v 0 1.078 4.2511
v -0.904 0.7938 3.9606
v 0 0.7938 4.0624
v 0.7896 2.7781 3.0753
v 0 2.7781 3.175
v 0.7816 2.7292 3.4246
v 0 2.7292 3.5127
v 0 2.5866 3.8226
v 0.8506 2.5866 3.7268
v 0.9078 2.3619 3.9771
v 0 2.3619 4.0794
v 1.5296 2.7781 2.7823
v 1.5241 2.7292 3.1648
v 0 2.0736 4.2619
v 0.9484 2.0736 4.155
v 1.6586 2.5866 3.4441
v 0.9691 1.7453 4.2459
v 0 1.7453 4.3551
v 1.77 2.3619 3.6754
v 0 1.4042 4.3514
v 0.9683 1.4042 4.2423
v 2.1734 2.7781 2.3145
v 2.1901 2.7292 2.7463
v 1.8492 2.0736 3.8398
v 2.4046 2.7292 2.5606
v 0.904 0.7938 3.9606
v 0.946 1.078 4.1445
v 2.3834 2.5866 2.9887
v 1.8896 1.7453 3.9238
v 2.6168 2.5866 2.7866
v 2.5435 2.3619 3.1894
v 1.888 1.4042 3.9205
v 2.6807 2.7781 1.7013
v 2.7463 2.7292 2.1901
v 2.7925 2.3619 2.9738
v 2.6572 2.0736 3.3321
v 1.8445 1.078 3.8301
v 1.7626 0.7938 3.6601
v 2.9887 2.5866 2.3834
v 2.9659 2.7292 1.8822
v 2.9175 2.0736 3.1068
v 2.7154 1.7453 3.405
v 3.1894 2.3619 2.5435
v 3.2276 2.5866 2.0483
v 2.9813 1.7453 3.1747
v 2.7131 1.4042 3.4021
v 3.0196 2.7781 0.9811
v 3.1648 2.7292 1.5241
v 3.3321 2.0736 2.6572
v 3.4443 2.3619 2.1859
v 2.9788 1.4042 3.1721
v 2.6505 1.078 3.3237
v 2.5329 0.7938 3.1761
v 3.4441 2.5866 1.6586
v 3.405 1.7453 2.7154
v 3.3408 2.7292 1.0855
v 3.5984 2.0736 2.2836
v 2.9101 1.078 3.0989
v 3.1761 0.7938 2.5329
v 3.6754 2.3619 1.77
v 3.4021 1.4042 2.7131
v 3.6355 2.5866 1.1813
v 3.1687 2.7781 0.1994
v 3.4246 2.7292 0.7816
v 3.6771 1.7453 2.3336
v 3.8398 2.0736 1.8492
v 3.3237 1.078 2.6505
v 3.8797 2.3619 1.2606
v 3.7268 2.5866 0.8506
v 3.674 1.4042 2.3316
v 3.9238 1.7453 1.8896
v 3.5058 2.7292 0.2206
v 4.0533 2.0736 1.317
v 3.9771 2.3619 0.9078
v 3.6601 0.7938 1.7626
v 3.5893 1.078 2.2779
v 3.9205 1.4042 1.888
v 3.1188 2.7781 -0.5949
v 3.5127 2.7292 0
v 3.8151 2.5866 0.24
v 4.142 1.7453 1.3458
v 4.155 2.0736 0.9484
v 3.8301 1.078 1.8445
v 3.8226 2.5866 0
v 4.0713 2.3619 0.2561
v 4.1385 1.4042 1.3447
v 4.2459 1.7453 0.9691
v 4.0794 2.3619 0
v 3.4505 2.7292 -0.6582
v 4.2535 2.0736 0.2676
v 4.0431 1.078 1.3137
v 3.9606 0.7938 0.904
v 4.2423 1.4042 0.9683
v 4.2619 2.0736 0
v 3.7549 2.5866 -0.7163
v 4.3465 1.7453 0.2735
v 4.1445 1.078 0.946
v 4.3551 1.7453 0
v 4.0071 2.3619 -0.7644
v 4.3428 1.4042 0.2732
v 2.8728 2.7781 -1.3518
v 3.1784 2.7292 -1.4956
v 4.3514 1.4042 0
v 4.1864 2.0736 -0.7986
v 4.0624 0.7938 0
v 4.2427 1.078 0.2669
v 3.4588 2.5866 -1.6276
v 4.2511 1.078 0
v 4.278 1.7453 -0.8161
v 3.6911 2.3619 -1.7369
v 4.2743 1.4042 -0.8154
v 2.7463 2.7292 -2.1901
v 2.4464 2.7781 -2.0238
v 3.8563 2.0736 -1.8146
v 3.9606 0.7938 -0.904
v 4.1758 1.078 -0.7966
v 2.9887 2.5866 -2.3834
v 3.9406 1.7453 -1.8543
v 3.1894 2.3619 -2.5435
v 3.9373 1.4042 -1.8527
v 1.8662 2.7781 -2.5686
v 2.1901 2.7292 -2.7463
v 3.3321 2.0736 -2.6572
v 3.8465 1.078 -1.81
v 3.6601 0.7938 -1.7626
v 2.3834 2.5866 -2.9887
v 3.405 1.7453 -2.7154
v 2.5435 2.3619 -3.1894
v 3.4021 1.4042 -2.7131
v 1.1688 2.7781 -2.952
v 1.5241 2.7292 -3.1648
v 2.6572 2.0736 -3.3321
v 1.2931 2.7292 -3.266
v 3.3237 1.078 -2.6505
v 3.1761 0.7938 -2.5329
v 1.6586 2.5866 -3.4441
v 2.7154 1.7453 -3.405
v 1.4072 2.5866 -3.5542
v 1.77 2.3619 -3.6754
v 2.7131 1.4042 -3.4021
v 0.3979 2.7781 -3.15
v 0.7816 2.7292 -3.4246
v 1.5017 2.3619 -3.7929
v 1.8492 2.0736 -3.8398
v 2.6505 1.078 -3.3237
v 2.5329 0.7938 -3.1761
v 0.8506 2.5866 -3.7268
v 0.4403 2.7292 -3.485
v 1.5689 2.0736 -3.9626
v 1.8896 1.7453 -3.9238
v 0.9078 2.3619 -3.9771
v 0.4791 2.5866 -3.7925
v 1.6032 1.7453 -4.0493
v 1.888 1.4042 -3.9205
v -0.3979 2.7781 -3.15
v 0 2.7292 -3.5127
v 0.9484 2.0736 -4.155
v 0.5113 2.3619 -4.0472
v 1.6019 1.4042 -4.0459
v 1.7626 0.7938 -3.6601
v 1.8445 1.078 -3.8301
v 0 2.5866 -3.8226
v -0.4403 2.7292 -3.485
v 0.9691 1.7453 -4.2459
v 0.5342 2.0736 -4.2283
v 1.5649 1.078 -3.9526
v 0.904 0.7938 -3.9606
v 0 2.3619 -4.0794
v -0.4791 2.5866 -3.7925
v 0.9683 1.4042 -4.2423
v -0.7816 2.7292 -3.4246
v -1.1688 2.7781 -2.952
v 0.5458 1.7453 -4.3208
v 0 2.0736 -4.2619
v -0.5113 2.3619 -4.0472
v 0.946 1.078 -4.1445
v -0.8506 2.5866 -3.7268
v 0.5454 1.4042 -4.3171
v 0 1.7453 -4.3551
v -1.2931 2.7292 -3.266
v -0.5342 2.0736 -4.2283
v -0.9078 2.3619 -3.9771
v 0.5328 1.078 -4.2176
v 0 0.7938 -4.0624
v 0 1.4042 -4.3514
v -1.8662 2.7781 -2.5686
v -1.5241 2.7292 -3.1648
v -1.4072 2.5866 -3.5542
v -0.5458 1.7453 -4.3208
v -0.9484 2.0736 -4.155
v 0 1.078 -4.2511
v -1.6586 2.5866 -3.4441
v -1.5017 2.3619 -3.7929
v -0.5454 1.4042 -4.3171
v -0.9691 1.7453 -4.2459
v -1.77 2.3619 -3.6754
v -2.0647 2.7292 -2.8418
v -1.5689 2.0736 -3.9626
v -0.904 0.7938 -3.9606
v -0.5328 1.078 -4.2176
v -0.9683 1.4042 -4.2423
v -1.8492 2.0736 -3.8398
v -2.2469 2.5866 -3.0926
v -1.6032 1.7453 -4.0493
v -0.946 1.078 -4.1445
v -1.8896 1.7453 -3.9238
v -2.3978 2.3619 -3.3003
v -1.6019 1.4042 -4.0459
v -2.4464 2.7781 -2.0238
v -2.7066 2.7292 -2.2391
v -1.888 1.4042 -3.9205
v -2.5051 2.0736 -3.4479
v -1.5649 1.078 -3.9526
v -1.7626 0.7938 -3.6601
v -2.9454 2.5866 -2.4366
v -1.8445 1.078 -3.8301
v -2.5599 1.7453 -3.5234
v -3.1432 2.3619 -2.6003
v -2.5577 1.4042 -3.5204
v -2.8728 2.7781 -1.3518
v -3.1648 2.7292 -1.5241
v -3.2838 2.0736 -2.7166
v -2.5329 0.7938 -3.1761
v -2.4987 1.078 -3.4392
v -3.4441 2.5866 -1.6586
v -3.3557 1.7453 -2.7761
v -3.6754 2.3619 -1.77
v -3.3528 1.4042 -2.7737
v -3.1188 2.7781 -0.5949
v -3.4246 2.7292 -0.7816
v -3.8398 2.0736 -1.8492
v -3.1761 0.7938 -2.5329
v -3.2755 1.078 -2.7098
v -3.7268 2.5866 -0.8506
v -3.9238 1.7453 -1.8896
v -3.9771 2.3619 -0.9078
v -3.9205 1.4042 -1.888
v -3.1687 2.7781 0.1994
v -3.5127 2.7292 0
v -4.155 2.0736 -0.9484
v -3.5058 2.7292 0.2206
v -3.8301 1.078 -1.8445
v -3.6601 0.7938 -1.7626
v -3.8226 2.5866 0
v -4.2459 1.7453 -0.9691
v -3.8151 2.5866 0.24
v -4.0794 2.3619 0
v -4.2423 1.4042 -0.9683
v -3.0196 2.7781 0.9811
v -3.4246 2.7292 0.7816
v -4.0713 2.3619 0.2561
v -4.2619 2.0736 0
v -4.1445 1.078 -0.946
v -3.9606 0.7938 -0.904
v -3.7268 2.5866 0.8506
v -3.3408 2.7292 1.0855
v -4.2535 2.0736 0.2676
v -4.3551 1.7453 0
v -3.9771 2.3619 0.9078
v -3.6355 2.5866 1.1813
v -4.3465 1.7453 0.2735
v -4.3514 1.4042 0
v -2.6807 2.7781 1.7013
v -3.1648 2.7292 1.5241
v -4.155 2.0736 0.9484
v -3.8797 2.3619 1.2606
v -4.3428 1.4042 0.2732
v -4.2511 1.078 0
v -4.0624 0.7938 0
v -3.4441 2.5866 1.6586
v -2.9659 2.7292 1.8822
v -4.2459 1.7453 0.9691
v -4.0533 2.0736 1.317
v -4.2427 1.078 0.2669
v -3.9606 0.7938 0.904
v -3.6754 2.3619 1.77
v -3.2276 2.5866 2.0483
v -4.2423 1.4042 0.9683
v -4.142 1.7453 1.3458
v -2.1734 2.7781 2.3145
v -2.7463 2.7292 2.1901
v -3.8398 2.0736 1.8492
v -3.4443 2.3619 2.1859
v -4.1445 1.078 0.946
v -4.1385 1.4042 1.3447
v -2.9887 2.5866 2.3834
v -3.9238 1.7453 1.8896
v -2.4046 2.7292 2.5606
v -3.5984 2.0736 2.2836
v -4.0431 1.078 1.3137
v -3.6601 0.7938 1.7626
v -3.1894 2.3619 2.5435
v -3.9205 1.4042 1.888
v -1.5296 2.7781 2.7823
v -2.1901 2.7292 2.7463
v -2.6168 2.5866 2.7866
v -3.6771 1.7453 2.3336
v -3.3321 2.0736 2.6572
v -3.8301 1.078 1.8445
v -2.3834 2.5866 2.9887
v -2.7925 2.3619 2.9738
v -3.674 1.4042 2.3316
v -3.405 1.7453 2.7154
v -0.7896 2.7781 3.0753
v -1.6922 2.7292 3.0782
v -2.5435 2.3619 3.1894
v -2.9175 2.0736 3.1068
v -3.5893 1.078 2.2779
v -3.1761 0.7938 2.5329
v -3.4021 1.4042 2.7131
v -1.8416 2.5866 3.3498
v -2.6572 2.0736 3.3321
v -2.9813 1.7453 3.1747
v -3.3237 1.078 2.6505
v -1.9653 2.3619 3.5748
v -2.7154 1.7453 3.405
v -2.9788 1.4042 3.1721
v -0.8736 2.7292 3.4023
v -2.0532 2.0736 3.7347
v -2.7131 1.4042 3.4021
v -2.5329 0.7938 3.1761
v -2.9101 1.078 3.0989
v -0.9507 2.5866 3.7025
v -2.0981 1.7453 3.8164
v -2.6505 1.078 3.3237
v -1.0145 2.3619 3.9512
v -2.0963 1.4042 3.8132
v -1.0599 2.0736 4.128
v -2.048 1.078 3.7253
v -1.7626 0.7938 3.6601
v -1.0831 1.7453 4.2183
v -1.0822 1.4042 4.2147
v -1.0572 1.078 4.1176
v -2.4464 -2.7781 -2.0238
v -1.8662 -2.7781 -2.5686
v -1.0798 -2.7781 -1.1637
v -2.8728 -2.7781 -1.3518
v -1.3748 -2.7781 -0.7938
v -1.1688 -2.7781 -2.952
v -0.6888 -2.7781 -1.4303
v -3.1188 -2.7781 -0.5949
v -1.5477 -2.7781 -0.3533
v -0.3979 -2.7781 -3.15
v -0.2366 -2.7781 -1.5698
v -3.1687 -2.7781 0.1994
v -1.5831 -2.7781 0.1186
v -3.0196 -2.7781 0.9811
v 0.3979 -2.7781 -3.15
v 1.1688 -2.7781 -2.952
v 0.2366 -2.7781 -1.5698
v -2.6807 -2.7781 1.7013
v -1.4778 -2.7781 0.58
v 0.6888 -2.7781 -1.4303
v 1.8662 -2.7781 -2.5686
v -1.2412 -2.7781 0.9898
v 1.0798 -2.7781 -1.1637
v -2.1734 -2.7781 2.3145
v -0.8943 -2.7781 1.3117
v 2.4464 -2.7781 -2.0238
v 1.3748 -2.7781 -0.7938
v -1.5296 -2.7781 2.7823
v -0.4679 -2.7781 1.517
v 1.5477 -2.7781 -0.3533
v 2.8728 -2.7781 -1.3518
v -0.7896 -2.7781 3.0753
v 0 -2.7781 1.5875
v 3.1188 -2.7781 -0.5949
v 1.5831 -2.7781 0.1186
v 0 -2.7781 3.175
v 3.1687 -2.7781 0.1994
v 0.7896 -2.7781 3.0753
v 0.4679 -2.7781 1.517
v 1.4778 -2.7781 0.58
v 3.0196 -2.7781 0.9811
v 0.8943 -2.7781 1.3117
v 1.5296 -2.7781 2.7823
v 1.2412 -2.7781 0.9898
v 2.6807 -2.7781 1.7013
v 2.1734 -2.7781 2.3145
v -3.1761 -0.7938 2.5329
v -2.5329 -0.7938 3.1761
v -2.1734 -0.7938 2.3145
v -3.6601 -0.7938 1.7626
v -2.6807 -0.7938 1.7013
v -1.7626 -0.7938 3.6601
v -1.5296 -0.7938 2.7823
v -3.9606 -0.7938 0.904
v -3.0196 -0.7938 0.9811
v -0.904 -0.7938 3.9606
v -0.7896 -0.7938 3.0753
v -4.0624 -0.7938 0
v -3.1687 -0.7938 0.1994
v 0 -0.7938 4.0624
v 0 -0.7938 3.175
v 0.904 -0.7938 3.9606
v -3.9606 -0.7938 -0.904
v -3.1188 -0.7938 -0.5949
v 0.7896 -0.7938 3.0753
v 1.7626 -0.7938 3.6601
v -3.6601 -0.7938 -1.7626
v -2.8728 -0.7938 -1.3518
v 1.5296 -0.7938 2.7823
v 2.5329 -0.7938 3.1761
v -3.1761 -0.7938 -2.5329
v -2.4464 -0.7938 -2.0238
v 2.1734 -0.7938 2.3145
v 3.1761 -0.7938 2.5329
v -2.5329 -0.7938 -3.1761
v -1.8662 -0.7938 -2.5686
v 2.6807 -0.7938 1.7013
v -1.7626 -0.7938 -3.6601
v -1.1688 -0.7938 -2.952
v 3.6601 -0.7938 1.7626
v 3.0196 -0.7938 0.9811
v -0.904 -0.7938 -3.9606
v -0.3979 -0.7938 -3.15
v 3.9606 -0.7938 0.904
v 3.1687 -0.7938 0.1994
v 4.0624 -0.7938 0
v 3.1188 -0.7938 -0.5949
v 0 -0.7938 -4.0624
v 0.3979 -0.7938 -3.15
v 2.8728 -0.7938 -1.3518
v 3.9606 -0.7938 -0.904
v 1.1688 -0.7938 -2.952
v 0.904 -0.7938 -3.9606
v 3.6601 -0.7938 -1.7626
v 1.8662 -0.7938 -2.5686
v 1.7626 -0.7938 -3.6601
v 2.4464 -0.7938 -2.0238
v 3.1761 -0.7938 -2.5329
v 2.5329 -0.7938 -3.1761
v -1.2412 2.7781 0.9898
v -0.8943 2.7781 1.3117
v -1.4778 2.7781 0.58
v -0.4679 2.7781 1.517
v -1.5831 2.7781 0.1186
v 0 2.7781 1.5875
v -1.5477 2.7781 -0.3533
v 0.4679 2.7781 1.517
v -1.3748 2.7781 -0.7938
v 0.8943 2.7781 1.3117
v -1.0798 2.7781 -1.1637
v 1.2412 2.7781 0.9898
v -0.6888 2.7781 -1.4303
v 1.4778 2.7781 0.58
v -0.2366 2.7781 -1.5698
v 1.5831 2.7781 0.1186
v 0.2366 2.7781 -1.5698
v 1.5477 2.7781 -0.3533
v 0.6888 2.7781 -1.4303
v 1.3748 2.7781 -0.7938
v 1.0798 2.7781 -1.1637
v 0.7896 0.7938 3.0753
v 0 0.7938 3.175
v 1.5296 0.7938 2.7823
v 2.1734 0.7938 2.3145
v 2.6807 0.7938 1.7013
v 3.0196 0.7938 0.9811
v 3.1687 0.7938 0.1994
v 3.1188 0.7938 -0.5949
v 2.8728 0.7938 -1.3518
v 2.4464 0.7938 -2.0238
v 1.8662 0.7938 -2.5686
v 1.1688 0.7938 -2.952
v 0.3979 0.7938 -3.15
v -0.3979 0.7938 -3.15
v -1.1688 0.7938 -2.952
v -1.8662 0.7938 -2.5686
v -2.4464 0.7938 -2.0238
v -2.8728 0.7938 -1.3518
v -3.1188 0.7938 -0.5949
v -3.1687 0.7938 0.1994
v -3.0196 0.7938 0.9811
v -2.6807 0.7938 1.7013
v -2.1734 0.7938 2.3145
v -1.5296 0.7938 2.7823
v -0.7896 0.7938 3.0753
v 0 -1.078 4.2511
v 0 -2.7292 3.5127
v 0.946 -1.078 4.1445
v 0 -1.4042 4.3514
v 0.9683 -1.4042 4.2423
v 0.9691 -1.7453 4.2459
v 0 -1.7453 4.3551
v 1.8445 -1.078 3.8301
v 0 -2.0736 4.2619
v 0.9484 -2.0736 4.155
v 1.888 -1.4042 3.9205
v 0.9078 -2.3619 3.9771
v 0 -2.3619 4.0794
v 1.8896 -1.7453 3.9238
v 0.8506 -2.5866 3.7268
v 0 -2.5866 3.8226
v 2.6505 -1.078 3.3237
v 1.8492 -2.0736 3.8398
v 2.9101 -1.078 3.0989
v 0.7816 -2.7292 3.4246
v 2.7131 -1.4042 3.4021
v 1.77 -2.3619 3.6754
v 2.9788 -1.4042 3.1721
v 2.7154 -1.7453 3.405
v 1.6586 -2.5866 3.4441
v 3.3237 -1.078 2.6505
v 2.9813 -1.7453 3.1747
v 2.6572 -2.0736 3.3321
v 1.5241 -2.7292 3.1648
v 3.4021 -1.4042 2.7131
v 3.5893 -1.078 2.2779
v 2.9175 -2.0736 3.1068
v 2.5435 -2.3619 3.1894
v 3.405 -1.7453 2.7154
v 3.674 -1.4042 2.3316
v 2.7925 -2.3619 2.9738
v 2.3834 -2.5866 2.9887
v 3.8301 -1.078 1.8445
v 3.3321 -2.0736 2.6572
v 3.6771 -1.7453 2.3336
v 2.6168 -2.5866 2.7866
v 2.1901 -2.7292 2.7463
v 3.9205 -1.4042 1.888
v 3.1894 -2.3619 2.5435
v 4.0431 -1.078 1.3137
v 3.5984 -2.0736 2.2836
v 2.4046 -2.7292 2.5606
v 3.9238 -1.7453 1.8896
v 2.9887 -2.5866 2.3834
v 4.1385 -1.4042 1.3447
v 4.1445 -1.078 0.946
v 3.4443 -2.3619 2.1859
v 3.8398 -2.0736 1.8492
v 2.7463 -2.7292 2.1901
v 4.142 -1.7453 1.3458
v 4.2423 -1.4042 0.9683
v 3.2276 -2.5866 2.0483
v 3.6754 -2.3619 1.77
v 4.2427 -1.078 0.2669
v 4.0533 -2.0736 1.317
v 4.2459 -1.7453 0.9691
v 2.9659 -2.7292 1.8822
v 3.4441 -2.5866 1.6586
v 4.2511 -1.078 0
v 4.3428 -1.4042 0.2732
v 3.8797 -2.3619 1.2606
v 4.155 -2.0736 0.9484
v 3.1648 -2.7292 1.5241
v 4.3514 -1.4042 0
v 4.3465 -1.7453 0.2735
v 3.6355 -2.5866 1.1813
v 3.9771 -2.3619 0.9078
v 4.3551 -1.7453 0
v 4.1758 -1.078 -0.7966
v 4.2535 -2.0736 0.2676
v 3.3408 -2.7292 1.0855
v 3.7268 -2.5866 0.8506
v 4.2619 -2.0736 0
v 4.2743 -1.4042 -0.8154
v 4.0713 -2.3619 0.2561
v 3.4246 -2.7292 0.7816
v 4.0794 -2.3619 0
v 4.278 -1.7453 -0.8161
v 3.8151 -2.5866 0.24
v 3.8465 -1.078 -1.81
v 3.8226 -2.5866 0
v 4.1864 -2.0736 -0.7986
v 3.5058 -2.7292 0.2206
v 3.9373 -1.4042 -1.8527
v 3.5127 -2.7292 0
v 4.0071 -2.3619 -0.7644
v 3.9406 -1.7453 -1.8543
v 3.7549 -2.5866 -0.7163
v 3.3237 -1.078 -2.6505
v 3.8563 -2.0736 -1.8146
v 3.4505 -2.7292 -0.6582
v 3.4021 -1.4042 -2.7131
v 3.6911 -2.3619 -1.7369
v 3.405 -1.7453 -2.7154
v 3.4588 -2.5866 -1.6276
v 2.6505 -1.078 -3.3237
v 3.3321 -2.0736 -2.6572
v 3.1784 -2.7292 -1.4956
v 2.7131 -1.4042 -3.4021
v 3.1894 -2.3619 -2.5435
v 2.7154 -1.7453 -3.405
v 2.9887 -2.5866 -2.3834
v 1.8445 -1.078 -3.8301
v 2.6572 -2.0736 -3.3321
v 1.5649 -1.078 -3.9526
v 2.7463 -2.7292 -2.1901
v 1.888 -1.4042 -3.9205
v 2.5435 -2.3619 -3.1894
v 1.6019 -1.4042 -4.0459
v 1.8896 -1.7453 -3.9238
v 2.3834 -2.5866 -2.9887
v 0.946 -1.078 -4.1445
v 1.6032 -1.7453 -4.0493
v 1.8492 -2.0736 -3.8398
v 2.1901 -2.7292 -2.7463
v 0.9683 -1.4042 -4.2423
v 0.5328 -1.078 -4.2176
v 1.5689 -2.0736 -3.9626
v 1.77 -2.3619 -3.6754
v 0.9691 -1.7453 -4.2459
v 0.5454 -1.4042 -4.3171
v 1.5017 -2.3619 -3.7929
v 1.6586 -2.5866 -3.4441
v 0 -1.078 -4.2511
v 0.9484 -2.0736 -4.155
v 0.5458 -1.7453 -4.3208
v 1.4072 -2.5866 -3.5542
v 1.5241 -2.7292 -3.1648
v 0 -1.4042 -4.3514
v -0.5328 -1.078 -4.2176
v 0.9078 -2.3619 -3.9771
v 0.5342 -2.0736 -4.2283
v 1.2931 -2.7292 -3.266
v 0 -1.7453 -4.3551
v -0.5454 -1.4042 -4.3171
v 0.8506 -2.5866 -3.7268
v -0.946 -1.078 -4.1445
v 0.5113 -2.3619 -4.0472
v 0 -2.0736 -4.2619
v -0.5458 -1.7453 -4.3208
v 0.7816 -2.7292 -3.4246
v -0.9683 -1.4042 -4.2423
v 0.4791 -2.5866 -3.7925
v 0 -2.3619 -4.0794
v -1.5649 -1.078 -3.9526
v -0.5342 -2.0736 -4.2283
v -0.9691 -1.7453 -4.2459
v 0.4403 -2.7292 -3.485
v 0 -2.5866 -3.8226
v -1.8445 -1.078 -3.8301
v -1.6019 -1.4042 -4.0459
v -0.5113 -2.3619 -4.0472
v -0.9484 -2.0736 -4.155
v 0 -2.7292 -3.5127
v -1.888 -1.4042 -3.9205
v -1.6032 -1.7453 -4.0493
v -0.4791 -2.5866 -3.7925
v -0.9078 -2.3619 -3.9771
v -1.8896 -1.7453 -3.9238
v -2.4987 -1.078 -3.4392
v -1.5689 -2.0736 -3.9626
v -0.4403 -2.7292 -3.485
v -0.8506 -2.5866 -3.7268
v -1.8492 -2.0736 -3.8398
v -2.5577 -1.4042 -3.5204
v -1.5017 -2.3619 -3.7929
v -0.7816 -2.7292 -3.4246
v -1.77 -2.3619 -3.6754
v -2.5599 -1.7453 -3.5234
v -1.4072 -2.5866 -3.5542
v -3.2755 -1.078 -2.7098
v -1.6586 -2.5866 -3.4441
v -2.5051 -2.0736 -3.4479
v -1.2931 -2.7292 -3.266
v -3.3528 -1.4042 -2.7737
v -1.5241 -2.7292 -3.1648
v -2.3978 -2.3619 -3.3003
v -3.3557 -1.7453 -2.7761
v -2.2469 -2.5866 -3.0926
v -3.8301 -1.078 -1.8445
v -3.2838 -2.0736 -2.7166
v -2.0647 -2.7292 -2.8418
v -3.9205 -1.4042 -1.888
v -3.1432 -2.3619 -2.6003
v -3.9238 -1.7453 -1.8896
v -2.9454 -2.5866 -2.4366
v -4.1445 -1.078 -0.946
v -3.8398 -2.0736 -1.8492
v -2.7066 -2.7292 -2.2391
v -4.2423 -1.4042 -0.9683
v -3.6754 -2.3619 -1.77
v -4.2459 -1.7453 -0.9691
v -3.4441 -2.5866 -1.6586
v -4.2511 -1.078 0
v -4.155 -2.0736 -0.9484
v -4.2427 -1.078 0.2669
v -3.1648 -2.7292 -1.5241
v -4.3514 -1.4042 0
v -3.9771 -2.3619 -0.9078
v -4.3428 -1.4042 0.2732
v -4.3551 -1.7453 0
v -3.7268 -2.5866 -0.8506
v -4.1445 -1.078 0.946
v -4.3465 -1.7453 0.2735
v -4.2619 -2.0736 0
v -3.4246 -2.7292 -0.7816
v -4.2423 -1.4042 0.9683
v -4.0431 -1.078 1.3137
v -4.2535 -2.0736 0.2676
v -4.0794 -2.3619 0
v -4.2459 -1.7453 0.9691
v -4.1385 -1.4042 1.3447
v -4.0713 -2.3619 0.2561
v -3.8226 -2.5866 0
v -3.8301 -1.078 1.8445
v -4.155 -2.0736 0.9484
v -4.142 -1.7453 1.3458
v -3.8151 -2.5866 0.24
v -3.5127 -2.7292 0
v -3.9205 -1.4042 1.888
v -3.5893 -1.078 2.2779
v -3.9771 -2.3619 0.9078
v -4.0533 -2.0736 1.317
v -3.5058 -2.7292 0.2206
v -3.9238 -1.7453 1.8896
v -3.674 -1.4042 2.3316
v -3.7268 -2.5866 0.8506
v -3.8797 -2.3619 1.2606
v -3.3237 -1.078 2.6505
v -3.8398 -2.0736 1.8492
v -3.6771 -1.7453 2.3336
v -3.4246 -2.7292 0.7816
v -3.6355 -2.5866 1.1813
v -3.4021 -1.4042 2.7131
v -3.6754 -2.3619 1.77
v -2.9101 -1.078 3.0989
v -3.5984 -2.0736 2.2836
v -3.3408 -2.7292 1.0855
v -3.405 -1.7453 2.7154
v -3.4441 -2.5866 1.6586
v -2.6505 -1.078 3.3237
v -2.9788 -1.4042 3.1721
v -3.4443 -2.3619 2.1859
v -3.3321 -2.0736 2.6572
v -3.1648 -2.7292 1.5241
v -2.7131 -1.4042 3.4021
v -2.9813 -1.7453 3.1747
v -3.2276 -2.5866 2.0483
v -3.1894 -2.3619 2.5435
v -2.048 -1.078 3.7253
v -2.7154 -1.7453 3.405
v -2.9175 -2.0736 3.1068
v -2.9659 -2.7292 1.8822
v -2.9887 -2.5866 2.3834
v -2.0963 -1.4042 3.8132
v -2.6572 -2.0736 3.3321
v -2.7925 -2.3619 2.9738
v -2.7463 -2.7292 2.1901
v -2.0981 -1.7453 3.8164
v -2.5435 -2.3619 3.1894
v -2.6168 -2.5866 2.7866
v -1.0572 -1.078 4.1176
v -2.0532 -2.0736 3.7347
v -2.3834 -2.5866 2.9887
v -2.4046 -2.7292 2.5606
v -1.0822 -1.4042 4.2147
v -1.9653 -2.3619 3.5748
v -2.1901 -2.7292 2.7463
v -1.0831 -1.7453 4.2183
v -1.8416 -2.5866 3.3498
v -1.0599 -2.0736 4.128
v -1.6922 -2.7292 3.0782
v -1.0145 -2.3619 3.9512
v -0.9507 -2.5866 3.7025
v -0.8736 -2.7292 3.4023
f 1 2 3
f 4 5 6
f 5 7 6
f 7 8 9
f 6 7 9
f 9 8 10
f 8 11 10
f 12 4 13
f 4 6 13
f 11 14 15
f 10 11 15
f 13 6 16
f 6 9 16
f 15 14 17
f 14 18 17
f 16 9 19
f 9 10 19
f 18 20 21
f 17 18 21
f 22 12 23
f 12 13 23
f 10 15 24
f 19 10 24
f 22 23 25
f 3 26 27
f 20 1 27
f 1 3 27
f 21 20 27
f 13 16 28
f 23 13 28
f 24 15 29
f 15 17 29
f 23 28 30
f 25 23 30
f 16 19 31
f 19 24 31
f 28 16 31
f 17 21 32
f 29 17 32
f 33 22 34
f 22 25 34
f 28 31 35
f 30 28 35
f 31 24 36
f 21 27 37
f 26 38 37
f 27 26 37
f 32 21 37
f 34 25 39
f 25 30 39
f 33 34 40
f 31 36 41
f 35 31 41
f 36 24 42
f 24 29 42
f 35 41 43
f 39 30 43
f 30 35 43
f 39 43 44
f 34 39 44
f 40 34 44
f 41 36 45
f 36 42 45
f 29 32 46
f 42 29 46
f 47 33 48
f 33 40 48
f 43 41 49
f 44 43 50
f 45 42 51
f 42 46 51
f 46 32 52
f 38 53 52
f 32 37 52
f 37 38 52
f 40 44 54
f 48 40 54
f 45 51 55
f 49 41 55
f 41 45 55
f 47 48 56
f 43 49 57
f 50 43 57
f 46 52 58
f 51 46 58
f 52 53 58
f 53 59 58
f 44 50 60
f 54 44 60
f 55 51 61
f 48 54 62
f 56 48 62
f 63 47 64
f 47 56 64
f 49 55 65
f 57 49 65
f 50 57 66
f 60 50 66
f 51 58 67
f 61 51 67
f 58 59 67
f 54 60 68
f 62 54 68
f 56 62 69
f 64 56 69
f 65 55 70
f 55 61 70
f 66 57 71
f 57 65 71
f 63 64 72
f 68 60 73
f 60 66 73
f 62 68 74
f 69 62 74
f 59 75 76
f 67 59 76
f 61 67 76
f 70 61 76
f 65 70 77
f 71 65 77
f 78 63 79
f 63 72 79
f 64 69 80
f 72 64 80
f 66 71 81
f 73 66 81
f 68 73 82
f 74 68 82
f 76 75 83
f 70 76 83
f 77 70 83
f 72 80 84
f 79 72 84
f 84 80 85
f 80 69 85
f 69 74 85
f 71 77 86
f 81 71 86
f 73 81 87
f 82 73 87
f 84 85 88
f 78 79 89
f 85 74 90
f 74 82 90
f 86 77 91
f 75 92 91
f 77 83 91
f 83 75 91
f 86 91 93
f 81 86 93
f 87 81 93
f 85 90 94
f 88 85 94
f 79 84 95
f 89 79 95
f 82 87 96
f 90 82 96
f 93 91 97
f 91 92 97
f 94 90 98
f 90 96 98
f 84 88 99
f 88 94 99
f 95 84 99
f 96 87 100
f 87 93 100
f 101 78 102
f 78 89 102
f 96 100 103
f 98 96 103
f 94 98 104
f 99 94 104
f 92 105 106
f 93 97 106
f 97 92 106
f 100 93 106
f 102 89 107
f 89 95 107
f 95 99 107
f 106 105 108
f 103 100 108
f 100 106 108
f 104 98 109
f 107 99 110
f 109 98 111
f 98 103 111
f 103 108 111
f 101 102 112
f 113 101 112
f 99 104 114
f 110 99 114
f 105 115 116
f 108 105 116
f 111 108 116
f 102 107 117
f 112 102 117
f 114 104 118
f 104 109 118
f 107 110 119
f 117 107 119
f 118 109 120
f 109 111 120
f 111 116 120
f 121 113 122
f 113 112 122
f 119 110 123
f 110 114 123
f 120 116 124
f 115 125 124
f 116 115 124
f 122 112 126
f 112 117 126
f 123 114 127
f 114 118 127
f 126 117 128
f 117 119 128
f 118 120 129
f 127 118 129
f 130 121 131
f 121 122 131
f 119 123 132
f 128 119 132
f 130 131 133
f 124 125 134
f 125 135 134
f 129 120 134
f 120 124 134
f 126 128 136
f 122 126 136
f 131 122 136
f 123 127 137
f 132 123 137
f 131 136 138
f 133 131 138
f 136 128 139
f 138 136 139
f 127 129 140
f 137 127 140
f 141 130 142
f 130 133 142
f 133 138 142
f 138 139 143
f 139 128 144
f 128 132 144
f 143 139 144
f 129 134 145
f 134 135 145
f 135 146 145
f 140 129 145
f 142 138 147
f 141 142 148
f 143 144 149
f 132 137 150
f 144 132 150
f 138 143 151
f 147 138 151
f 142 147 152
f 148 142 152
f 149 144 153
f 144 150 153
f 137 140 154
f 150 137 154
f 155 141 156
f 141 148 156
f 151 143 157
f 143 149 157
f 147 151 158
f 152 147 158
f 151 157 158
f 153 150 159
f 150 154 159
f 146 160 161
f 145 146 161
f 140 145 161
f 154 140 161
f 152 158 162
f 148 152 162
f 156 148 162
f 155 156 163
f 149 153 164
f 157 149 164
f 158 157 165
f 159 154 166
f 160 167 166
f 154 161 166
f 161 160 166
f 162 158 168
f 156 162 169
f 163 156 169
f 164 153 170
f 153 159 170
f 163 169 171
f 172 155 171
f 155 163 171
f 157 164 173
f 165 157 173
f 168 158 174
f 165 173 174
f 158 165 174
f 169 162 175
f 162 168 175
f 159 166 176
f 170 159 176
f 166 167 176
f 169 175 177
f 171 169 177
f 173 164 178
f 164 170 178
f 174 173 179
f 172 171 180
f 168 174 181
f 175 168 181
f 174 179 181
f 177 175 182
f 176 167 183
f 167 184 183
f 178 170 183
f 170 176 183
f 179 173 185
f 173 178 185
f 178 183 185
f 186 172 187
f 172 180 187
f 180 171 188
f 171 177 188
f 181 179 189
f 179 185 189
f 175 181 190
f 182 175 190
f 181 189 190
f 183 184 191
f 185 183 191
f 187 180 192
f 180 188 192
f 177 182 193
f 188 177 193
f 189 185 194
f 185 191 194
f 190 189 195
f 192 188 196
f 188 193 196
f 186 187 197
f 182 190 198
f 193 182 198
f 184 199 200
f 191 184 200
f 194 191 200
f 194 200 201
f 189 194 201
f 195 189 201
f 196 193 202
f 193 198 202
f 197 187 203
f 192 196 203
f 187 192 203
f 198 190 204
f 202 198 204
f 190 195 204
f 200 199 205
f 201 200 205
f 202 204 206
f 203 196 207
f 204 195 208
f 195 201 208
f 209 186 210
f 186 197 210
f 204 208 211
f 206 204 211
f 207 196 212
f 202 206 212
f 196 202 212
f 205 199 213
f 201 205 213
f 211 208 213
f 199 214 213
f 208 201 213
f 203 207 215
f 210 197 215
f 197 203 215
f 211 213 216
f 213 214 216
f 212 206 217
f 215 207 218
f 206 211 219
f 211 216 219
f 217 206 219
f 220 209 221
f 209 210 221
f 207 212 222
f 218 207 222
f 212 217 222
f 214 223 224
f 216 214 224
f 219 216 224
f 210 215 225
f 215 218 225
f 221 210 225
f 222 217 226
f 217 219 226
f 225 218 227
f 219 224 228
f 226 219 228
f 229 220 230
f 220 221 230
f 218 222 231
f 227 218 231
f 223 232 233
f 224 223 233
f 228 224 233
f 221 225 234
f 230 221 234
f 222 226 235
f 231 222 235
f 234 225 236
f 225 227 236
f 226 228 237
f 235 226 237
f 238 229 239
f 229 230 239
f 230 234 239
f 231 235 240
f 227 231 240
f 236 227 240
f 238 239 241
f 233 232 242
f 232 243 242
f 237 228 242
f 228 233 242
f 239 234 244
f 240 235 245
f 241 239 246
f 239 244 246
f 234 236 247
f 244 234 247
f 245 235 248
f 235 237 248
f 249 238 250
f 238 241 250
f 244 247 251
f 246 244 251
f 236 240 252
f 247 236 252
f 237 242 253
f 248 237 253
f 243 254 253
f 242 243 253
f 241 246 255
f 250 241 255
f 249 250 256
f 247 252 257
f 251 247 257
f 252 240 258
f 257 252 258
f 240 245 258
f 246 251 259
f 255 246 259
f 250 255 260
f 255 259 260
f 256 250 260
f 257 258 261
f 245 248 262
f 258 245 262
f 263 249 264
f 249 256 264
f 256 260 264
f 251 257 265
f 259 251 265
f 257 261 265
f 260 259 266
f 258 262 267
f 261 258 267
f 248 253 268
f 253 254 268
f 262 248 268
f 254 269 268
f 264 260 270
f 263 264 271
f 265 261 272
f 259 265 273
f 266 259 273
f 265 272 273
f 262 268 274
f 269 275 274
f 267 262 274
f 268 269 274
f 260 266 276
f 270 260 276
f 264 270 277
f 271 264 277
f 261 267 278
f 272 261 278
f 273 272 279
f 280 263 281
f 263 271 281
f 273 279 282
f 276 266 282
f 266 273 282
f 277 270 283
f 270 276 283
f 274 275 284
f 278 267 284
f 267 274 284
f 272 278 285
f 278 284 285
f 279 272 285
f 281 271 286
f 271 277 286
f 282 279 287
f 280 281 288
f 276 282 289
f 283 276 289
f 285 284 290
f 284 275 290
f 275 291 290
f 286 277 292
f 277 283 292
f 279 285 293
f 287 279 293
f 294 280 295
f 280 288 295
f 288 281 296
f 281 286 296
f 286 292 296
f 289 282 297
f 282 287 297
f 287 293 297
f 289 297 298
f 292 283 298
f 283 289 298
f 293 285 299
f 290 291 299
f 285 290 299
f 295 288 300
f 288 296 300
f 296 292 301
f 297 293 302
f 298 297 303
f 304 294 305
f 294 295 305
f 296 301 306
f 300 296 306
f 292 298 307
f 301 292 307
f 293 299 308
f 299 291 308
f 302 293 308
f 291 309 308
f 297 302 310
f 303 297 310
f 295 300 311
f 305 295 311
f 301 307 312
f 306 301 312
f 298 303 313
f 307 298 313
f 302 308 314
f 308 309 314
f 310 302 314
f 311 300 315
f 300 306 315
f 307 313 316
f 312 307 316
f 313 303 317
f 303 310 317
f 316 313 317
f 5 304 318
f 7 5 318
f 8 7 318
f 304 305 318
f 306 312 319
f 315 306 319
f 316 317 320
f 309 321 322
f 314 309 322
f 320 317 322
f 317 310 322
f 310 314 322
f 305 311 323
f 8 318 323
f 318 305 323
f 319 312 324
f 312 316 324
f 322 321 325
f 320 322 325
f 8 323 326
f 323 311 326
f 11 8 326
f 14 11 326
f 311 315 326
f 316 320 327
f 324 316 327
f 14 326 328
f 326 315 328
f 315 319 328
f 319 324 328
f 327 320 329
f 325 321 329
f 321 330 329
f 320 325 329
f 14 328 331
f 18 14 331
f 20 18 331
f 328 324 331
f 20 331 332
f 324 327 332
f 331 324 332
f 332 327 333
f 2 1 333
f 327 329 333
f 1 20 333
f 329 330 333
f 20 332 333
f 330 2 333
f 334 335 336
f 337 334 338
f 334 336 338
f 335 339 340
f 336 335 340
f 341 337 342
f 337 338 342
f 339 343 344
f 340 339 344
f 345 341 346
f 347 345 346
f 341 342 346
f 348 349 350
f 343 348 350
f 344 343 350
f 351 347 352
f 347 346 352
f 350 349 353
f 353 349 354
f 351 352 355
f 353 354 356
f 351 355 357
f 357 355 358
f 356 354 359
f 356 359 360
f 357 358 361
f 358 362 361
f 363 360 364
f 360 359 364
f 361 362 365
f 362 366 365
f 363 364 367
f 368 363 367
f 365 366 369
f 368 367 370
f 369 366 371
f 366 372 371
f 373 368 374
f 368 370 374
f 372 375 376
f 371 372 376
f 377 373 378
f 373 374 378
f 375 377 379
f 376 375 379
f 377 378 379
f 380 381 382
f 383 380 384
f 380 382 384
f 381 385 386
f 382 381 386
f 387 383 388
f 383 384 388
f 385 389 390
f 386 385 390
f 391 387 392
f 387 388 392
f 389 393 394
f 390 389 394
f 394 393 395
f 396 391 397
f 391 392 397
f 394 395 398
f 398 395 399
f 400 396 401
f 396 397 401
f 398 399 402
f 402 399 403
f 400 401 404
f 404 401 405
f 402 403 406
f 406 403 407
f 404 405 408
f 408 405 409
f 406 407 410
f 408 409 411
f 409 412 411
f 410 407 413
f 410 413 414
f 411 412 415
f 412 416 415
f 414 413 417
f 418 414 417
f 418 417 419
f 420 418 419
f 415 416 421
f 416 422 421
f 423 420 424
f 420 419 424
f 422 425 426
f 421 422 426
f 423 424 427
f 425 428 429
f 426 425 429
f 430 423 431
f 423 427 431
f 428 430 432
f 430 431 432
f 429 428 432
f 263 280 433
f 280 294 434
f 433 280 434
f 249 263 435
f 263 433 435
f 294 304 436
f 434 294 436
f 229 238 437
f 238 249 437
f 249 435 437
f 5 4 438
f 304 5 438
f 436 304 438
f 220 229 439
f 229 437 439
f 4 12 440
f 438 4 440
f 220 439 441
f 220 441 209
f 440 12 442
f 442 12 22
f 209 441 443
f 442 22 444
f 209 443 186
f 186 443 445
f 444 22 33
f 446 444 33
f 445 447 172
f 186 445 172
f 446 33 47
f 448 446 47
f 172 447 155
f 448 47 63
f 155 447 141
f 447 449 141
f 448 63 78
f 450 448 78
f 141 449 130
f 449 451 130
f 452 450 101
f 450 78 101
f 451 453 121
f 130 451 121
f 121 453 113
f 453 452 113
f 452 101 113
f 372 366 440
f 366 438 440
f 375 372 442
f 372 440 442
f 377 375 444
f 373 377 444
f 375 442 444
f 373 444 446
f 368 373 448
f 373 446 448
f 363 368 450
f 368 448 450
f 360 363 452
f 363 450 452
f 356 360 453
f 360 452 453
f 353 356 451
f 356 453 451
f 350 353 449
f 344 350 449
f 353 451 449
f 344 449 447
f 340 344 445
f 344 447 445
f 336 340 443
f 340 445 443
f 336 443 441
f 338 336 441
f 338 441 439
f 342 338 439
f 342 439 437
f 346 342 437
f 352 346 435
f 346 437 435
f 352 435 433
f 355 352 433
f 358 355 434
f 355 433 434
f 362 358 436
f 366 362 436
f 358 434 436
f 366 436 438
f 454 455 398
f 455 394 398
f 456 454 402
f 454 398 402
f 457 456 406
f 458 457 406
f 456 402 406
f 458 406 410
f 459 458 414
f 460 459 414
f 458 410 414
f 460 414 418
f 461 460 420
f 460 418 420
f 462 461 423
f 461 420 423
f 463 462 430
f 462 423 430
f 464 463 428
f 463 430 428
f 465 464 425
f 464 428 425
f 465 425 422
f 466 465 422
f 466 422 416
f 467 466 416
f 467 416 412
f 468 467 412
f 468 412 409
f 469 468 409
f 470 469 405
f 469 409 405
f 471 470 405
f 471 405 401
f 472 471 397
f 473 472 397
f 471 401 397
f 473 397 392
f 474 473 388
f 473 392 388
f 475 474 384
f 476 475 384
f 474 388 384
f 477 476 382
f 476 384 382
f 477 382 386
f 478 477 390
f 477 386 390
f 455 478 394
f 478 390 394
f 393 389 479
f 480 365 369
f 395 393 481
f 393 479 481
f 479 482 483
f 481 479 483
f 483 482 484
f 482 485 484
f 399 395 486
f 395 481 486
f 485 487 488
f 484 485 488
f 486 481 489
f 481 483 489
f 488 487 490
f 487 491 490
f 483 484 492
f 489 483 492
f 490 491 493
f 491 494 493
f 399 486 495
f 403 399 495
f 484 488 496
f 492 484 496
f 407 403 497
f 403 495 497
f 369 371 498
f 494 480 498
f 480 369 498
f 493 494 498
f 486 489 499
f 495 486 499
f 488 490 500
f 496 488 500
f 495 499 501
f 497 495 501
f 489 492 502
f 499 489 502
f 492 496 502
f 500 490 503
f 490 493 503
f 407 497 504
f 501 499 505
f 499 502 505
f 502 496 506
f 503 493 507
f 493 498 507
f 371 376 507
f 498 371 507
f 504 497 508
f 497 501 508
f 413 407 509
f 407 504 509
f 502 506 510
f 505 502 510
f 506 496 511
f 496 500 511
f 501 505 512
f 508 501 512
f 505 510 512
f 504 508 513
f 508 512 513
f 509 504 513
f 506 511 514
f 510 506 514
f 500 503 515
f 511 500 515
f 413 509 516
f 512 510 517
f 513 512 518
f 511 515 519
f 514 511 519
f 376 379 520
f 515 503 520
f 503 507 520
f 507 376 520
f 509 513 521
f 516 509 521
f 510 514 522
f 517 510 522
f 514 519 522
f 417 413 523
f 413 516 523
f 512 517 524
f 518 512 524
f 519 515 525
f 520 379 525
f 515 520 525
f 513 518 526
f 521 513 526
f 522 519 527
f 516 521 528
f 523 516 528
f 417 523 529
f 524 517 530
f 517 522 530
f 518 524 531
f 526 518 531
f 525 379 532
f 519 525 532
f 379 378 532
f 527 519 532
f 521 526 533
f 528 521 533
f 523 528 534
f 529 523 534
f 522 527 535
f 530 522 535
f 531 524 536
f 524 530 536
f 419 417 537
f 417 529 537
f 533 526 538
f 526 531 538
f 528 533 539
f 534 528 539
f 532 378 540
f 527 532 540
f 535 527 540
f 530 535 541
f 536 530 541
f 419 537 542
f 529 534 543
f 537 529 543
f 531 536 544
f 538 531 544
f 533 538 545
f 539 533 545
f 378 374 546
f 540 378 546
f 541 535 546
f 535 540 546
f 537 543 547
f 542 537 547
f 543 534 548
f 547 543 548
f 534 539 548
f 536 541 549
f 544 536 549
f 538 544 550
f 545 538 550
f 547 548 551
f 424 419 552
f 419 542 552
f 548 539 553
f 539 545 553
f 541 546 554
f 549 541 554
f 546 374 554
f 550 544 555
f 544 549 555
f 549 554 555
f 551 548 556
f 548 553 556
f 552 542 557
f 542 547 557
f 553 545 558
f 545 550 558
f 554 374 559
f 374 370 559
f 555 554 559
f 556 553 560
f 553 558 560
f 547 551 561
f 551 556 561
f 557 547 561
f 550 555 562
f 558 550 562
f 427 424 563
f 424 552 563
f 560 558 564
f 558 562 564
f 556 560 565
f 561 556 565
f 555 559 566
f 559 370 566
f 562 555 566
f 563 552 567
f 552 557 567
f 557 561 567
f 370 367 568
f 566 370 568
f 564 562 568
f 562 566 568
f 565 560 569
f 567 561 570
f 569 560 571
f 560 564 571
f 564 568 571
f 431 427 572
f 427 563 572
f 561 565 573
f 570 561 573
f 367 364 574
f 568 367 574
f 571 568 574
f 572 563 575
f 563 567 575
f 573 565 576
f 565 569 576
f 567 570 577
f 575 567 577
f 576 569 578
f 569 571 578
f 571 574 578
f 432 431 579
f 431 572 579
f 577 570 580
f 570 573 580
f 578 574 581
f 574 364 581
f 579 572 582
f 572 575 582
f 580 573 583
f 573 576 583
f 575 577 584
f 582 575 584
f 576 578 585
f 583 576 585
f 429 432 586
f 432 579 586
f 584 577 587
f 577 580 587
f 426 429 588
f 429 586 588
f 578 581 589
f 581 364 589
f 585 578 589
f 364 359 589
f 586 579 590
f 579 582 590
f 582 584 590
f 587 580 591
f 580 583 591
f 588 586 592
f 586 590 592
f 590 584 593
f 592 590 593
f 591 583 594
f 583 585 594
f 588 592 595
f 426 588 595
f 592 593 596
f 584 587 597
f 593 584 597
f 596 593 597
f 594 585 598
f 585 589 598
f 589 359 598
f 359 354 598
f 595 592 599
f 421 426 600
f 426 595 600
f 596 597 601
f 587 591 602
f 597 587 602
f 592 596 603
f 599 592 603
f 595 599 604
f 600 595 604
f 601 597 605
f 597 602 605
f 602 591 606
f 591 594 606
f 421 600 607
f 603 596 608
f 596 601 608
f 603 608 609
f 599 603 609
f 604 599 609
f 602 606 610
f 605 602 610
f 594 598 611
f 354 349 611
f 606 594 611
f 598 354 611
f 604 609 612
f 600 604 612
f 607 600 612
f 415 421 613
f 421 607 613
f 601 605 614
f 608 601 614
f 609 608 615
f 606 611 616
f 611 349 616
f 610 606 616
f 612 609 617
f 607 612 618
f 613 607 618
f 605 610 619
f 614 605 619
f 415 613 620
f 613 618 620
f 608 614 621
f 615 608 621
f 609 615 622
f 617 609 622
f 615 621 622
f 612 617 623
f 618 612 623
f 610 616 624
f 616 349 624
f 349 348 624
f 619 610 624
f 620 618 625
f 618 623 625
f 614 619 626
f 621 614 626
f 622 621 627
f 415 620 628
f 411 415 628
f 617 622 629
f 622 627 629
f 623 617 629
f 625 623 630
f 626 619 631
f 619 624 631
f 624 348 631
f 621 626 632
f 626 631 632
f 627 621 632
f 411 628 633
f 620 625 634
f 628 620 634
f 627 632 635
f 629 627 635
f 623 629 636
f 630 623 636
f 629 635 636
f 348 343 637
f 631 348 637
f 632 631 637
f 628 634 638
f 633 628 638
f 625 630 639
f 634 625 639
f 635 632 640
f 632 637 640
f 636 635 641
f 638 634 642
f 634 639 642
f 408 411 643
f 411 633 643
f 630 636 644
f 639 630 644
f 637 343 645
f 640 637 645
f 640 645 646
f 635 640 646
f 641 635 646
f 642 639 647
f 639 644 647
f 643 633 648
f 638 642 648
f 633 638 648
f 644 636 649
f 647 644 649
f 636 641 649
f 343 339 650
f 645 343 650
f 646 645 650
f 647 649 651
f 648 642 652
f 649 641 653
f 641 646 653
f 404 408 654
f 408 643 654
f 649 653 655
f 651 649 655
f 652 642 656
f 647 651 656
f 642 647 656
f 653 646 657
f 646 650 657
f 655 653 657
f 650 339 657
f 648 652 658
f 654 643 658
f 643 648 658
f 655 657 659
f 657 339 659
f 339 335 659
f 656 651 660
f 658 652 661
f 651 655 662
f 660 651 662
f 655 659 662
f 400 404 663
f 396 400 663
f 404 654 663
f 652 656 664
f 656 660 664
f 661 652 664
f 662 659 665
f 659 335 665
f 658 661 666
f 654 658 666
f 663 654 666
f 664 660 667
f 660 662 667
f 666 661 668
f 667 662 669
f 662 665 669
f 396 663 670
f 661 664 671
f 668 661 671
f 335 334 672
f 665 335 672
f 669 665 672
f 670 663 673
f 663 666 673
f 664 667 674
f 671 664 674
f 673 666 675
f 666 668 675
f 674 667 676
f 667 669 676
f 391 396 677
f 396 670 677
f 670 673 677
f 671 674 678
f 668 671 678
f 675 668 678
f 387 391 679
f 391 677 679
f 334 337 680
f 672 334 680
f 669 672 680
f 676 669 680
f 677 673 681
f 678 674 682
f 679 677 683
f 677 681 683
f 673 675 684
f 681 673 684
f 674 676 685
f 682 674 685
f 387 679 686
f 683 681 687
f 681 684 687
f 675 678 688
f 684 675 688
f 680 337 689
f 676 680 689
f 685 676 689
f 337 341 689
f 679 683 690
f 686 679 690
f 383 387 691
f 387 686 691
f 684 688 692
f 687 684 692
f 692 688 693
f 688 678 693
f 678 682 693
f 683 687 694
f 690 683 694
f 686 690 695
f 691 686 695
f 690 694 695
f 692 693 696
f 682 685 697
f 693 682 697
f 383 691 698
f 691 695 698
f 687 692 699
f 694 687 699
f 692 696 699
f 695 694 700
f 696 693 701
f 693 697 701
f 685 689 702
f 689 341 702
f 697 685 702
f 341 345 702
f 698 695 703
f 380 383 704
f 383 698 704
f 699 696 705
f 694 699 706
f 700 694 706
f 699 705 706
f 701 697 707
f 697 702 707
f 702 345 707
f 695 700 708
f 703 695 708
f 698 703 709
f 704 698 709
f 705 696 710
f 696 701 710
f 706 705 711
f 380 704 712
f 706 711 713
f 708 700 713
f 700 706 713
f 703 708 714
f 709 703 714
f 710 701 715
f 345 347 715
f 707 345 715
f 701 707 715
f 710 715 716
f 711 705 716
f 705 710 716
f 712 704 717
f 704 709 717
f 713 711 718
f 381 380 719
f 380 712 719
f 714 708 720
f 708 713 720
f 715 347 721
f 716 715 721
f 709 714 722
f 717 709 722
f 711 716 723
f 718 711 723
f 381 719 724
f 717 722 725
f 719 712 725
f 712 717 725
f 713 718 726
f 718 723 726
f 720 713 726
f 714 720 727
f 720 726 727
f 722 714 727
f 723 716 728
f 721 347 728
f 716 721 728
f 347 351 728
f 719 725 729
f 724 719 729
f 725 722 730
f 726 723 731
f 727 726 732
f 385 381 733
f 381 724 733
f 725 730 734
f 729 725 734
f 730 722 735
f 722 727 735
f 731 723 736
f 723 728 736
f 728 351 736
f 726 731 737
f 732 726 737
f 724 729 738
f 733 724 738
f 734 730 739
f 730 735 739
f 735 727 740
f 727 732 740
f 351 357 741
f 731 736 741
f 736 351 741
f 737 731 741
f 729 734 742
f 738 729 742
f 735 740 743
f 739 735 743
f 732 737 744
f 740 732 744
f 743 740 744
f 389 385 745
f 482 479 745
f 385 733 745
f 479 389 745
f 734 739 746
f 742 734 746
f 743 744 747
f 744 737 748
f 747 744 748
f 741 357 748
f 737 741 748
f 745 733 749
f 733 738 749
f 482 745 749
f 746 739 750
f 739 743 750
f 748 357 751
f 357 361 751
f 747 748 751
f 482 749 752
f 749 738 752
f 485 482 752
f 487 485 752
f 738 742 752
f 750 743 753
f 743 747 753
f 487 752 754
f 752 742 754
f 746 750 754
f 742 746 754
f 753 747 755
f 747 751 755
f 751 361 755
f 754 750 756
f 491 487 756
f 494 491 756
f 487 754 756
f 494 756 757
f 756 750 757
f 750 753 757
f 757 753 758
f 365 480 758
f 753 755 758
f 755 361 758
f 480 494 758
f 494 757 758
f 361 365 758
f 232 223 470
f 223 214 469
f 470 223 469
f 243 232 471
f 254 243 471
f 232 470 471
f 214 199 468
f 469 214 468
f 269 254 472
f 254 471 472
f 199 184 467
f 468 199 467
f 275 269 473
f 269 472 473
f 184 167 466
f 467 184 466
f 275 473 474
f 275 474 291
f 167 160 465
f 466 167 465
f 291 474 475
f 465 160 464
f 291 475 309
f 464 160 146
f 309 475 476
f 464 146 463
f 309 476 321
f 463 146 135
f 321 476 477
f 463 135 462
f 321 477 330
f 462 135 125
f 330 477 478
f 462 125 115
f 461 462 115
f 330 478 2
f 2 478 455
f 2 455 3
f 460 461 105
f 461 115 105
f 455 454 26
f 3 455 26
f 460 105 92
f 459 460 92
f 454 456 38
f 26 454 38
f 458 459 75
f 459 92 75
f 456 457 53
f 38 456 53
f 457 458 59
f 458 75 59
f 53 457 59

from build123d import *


with BuildPart() as part:
    # Sketch2 → Revolve1 (revolve)
    with BuildSketch(Plane(origin=(0, 0, 0), x_dir=(0, 0, -1), z_dir=(1, 0, 0))):
        with BuildLine():
            Line((-1.5875, -2.778125), (-1.5875, 2.778125))
            Line((-1.5875, 2.778125), (-3.175, 2.778125))
            ThreePointArc((-3.175, 2.778125), (-4.26188695, 2.073570621), (-4.062439479, 0.79375))
            Line((-4.062439479, 0.79375), (-3.175, 0.79375))
            Line((-3.175, 0.79375), (-3.175, -0.79375))
            Line((-3.175, -0.79375), (-4.062439479, -0.79375))
            ThreePointArc((-4.062439479, -0.79375), (-4.26188695, -2.073570621), (-3.175, -2.778125))
            Line((-3.175, -2.778125), (-1.5875, -2.778125))
        make_face()
    revolve(axis=Axis((0, -2.778125, 0), (0, 1, 0)))


solid = part.part
